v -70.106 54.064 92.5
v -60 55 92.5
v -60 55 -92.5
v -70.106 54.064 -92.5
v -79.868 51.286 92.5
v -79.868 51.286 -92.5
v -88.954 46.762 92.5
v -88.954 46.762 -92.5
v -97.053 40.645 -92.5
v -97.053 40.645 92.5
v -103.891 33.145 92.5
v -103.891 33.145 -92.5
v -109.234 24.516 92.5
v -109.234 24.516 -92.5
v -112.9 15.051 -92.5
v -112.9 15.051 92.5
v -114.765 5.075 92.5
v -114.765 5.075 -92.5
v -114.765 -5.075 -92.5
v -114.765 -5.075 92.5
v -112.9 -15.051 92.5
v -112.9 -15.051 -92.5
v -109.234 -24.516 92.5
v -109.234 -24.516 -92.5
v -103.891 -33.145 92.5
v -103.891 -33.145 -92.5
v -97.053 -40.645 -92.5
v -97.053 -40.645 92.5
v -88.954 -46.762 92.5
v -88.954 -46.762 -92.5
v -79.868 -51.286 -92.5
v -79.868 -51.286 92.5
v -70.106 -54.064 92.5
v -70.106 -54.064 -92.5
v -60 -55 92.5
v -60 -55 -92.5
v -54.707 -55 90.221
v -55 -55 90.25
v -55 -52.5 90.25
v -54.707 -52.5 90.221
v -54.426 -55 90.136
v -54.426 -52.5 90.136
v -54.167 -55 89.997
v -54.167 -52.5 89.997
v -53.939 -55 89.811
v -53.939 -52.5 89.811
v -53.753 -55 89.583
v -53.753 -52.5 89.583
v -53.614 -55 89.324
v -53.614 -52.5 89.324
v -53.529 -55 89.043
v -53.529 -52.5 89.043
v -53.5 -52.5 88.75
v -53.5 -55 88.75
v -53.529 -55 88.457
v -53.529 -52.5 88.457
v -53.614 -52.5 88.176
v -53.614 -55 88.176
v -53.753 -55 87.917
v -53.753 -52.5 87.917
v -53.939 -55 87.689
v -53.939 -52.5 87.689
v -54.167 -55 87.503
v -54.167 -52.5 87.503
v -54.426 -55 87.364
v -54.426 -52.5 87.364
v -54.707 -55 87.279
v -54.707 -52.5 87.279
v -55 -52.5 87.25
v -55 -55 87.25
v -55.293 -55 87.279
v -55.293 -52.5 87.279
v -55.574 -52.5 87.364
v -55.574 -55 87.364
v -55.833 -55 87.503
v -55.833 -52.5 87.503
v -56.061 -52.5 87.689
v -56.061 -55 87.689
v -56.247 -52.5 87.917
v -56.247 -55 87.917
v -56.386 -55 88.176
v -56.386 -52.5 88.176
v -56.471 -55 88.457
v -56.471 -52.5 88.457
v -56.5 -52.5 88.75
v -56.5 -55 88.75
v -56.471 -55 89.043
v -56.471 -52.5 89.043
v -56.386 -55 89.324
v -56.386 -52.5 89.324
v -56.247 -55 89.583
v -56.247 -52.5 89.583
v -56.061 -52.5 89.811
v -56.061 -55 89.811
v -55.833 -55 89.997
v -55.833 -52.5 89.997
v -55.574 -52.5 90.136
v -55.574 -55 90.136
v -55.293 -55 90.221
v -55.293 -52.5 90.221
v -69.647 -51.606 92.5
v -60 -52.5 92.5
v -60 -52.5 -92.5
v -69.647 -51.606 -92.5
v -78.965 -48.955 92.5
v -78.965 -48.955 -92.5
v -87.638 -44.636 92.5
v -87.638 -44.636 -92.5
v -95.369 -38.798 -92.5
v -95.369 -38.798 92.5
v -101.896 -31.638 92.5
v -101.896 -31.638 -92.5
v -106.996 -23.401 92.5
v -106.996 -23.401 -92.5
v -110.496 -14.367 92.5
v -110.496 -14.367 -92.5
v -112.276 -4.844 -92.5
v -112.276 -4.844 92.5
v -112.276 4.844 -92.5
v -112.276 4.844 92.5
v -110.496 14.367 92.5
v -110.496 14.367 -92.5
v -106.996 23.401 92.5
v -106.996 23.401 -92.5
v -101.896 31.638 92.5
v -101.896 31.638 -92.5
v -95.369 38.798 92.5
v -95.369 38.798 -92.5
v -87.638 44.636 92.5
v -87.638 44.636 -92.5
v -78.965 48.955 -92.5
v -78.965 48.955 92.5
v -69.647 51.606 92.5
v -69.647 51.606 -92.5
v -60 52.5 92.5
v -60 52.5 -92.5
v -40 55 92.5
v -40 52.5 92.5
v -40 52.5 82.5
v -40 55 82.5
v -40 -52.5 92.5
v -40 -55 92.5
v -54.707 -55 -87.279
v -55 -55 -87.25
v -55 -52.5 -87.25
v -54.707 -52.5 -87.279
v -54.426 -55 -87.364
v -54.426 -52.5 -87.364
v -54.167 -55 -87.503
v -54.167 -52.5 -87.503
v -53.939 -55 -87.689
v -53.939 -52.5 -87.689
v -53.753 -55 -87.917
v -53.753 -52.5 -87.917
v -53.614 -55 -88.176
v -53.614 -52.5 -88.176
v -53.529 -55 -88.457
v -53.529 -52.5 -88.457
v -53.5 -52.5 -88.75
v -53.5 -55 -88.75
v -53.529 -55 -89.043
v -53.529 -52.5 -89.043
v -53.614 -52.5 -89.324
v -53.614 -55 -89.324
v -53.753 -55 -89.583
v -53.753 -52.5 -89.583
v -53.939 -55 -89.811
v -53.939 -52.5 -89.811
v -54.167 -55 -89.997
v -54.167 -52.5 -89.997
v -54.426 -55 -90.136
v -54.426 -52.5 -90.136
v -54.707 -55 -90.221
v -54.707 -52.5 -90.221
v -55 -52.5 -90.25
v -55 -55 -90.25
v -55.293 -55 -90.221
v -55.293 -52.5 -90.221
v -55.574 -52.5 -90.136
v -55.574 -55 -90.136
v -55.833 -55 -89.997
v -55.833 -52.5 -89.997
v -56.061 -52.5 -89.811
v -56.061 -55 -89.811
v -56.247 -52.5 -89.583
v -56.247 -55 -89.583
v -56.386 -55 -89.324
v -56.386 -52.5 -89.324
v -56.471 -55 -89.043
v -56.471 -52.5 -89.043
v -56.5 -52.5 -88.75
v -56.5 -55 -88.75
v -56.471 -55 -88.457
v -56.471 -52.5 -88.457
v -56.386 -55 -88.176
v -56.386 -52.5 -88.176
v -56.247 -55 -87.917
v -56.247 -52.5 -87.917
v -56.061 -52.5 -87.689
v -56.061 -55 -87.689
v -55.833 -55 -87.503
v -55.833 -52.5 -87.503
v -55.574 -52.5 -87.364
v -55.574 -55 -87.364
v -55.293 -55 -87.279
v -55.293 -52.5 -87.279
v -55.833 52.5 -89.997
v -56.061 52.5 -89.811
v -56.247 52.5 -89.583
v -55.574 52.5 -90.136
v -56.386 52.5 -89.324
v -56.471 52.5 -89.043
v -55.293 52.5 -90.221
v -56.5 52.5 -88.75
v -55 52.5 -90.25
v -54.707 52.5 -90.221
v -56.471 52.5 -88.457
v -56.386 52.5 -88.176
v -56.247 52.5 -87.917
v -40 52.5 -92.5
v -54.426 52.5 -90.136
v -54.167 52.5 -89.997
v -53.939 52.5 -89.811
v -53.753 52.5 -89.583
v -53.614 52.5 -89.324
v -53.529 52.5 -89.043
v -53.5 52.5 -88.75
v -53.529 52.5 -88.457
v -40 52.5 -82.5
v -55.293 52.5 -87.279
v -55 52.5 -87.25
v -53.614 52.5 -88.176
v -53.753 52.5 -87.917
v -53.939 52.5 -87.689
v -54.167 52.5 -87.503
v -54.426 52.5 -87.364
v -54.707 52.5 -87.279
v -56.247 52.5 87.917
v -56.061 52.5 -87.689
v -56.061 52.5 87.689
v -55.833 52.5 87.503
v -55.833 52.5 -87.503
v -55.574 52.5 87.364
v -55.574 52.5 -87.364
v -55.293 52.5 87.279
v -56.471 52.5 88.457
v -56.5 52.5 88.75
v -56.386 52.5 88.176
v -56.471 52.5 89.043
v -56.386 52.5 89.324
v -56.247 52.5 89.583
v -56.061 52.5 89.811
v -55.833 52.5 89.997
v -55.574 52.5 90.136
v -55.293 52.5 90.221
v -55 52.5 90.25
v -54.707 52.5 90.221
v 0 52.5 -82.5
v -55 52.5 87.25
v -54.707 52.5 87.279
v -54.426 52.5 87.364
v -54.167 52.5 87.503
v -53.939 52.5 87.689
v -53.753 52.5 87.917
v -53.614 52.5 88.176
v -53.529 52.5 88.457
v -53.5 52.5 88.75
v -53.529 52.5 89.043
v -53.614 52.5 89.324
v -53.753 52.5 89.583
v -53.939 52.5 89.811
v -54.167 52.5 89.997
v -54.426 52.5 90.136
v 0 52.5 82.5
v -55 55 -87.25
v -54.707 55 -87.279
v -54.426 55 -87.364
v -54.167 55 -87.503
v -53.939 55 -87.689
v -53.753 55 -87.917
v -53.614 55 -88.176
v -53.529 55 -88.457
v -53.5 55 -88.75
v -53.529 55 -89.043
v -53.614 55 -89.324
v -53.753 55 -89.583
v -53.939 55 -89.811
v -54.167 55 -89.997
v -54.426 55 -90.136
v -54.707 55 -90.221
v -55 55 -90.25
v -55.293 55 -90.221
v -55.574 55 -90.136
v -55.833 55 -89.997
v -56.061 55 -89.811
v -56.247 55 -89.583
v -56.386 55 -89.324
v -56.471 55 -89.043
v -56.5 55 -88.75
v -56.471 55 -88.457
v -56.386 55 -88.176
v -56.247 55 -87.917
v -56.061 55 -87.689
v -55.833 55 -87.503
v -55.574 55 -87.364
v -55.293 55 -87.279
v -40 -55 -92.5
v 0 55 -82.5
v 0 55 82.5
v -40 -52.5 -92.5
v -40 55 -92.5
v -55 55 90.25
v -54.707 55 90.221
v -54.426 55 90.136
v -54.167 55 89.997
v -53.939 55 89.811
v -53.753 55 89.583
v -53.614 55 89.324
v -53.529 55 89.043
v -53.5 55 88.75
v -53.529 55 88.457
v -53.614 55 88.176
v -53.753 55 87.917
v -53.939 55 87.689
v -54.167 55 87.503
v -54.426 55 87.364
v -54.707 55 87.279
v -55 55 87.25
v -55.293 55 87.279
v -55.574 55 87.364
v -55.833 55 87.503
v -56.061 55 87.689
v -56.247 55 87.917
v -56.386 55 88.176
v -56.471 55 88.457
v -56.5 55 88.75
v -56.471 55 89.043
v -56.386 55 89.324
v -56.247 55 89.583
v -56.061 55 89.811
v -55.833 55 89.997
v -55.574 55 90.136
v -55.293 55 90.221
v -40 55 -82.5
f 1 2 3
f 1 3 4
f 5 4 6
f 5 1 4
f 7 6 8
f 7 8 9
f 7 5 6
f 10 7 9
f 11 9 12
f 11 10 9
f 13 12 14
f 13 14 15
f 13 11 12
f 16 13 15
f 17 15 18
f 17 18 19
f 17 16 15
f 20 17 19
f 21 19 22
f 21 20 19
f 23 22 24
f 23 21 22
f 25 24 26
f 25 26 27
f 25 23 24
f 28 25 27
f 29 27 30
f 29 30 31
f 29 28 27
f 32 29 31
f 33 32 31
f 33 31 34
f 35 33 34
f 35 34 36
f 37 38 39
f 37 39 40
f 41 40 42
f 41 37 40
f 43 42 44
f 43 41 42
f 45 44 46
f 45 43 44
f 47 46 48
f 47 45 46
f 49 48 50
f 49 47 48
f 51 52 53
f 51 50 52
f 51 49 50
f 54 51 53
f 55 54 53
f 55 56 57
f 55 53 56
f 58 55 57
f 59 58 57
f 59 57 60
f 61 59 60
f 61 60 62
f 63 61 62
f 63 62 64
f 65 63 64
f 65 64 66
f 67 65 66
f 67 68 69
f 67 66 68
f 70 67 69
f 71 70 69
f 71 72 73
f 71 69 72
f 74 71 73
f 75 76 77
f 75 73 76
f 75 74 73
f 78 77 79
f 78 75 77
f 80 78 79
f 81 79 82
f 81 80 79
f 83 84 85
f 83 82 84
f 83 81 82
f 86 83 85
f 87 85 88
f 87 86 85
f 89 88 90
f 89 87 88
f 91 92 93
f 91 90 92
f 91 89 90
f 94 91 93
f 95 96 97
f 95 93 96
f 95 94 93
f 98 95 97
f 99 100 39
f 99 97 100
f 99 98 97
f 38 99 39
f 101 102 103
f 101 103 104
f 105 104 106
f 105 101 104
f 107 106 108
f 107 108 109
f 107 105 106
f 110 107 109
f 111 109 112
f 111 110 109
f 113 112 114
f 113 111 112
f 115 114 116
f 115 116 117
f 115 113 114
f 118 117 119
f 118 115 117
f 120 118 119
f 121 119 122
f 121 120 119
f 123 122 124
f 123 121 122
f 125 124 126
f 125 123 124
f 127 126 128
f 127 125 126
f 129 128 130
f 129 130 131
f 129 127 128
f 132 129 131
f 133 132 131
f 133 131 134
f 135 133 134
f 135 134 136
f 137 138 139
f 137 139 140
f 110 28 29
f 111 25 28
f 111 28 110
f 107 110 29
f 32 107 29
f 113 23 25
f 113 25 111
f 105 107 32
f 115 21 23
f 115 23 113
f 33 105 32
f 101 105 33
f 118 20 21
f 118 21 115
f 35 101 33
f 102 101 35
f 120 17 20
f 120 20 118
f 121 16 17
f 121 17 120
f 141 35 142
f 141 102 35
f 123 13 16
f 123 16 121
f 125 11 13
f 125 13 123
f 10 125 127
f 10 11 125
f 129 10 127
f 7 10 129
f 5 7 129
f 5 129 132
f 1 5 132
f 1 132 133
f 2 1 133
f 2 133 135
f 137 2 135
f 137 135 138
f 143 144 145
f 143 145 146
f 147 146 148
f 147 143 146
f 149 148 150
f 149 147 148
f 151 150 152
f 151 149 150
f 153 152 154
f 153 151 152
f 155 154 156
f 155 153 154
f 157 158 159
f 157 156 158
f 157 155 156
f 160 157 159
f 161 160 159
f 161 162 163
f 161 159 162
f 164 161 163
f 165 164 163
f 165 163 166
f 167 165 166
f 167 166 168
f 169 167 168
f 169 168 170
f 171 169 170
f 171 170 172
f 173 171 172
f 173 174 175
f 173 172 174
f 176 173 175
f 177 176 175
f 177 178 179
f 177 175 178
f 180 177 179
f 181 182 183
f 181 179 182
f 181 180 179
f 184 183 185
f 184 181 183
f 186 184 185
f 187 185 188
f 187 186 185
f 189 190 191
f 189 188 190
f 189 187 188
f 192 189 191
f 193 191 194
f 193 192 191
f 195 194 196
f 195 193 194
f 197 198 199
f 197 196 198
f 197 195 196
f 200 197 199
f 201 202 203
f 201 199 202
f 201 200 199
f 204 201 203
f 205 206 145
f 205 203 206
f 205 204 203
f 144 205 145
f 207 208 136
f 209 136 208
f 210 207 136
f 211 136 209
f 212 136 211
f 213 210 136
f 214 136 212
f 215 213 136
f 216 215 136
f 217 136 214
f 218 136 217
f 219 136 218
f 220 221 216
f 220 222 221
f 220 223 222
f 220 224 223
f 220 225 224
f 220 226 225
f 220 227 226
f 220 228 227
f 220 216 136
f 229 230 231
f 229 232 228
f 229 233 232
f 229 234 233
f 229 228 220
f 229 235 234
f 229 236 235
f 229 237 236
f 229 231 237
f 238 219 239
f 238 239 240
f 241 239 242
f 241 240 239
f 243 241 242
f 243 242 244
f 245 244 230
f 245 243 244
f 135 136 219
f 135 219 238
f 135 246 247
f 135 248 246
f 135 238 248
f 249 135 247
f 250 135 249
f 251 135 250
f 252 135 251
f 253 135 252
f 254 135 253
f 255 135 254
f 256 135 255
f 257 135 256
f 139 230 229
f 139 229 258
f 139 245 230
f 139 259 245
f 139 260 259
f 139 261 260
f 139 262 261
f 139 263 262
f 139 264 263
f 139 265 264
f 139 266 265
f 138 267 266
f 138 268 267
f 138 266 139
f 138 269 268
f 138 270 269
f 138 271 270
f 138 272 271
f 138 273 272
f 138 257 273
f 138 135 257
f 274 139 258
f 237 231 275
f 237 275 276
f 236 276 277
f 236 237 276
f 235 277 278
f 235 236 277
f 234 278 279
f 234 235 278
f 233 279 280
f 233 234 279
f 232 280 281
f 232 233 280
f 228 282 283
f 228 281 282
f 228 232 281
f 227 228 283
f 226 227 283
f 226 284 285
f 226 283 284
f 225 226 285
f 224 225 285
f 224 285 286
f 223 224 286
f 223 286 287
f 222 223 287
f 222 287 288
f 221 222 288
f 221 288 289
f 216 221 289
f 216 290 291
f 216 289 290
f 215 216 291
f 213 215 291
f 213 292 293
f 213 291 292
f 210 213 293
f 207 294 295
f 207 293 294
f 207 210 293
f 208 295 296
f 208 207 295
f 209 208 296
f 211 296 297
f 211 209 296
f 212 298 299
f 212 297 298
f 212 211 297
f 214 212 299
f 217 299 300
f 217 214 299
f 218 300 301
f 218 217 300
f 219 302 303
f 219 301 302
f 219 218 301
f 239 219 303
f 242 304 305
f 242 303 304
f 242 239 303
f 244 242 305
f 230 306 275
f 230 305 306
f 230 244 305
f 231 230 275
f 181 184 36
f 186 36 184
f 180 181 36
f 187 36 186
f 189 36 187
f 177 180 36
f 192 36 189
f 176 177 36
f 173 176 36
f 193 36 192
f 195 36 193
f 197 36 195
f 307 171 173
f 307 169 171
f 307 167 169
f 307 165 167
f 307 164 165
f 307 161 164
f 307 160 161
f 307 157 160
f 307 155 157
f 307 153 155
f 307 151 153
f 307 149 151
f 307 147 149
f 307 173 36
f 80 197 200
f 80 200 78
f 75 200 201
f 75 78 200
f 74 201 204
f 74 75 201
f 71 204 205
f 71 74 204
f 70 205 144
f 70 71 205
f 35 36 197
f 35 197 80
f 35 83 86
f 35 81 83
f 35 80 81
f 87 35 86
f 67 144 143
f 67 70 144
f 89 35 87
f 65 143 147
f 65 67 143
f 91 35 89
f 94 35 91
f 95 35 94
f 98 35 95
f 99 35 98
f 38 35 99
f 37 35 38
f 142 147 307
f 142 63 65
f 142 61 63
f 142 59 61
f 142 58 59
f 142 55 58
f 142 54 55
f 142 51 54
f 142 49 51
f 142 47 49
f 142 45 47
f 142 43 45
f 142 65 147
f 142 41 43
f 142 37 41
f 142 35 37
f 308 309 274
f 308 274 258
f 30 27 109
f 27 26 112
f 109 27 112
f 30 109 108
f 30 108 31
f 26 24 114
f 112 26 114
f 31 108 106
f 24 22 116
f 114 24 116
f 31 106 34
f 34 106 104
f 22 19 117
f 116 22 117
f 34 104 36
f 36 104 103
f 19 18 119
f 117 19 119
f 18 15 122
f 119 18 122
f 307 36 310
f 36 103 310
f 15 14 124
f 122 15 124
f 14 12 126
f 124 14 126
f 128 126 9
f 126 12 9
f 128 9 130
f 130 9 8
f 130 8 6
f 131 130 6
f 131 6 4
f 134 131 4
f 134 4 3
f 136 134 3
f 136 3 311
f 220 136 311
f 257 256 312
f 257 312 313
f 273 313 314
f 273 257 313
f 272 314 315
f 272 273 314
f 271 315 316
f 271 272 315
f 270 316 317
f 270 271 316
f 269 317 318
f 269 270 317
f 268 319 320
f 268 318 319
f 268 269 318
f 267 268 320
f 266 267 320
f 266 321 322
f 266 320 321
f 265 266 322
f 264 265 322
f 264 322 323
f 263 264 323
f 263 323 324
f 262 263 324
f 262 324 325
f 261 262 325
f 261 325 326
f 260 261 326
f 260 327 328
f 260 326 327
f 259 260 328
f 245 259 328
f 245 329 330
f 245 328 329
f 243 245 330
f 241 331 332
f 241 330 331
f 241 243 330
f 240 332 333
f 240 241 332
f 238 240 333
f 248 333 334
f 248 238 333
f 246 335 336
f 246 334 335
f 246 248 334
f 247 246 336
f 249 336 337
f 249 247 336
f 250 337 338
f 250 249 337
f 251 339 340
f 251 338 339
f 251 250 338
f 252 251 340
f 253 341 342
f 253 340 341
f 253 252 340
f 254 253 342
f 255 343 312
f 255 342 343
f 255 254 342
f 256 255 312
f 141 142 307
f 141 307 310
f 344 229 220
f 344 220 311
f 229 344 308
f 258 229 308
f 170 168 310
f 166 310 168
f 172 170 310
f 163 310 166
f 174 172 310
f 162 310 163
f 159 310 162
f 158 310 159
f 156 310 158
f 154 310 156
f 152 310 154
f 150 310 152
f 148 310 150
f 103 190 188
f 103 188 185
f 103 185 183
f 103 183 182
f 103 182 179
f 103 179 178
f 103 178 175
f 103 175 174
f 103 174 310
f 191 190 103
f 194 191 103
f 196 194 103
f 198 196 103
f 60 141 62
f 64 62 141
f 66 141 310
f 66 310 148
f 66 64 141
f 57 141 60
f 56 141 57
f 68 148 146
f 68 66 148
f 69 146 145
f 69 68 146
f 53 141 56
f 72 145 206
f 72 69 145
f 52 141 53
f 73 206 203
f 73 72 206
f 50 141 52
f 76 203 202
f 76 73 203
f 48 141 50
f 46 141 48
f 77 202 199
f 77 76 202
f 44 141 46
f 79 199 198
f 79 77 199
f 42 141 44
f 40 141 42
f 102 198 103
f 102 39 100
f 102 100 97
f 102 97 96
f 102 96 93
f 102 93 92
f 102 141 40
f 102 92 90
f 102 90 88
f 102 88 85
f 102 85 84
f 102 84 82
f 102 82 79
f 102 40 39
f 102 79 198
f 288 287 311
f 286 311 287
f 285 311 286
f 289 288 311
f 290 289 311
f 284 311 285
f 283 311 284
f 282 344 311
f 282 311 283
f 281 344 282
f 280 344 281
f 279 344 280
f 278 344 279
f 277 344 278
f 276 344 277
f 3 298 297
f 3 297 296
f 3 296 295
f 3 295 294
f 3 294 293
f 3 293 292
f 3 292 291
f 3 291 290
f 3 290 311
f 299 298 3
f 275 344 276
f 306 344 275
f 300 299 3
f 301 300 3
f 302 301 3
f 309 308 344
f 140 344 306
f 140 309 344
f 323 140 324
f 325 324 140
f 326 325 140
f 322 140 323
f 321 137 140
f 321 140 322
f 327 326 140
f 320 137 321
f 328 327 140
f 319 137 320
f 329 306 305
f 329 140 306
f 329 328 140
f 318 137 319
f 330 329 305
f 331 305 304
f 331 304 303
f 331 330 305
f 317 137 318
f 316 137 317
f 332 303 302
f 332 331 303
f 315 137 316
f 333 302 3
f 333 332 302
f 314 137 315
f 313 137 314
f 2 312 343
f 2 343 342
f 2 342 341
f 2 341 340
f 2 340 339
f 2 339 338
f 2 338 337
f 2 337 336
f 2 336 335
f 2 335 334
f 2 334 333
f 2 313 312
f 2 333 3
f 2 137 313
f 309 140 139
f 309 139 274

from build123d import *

# Parameters (mm, degrees)
BOSS_EXTRUDE1_DEPTH     = 92.5
CUT_EXTRUDE2_DEPTH      = 158.5
CUT_EXTRUDE2_DEPTH_BACK = 158.5
SKETCH3_R               = 1.5
SKETCH4_W               = 40
SKETCH4_H               = 165
BOSS_EXTRUDE2_DEPTH     = 2.5


with BuildPart() as part:
    # Sketch1 → Boss-Extrude1 (new, symmetric)
    with BuildSketch(Plane.XY):
        with BuildLine():
            Line((-40, 55), (-60, 55))
            ThreePointArc((-60, 55), (-115, 0), (-60, -55))
            Line((-60, -55), (-40, -55))
            Line((-40, -55), (-40, -52.5))
            Line((-40, -52.5), (-60, -52.5))
            ThreePointArc((-60, -52.5), (-112.5, 0), (-60, 52.5))
            Line((-60, 52.5), (-40, 52.5))
            Line((-40, 52.5), (-40, 55))
        make_face()
    extrude(amount=BOSS_EXTRUDE1_DEPTH, both=True)

    # Sketch3 → Cut-Extrude2 (cut, two sides: drawn at the far end of the back side and taken through both)
    with BuildSketch(Plane(origin=(0, 0, 0), x_dir=(1, 0, 0), z_dir=(0, 1, 0)).offset(-CUT_EXTRUDE2_DEPTH_BACK)):
        with Locations(Location((-55, 88.75, 0), (0, 0, 270))):
            Circle(SKETCH3_R)
        with Locations((-33, 88.75)):
            Circle(SKETCH3_R)
        with Locations((-11, 88.75)):
            Circle(SKETCH3_R)
        with Locations((-11, -88.75)):
            Circle(SKETCH3_R)
        with Locations((-33, -88.75)):
            Circle(SKETCH3_R)
        with Locations(Location((-55, -88.75, 0), (0, 0, 270))):
            Circle(SKETCH3_R)
    extrude(amount=CUT_EXTRUDE2_DEPTH + CUT_EXTRUDE2_DEPTH_BACK, mode=Mode.SUBTRACT)

    # Sketch4 → Boss-Extrude2 (add)
    with BuildSketch(Plane(origin=(0, 55, 0), x_dir=(1, 0, 0), z_dir=(0, 1, 0))):
        with Locations((-20, 0)):
            Rectangle(SKETCH4_W, SKETCH4_H)
    extrude(amount=-BOSS_EXTRUDE2_DEPTH)


solid = part.part
